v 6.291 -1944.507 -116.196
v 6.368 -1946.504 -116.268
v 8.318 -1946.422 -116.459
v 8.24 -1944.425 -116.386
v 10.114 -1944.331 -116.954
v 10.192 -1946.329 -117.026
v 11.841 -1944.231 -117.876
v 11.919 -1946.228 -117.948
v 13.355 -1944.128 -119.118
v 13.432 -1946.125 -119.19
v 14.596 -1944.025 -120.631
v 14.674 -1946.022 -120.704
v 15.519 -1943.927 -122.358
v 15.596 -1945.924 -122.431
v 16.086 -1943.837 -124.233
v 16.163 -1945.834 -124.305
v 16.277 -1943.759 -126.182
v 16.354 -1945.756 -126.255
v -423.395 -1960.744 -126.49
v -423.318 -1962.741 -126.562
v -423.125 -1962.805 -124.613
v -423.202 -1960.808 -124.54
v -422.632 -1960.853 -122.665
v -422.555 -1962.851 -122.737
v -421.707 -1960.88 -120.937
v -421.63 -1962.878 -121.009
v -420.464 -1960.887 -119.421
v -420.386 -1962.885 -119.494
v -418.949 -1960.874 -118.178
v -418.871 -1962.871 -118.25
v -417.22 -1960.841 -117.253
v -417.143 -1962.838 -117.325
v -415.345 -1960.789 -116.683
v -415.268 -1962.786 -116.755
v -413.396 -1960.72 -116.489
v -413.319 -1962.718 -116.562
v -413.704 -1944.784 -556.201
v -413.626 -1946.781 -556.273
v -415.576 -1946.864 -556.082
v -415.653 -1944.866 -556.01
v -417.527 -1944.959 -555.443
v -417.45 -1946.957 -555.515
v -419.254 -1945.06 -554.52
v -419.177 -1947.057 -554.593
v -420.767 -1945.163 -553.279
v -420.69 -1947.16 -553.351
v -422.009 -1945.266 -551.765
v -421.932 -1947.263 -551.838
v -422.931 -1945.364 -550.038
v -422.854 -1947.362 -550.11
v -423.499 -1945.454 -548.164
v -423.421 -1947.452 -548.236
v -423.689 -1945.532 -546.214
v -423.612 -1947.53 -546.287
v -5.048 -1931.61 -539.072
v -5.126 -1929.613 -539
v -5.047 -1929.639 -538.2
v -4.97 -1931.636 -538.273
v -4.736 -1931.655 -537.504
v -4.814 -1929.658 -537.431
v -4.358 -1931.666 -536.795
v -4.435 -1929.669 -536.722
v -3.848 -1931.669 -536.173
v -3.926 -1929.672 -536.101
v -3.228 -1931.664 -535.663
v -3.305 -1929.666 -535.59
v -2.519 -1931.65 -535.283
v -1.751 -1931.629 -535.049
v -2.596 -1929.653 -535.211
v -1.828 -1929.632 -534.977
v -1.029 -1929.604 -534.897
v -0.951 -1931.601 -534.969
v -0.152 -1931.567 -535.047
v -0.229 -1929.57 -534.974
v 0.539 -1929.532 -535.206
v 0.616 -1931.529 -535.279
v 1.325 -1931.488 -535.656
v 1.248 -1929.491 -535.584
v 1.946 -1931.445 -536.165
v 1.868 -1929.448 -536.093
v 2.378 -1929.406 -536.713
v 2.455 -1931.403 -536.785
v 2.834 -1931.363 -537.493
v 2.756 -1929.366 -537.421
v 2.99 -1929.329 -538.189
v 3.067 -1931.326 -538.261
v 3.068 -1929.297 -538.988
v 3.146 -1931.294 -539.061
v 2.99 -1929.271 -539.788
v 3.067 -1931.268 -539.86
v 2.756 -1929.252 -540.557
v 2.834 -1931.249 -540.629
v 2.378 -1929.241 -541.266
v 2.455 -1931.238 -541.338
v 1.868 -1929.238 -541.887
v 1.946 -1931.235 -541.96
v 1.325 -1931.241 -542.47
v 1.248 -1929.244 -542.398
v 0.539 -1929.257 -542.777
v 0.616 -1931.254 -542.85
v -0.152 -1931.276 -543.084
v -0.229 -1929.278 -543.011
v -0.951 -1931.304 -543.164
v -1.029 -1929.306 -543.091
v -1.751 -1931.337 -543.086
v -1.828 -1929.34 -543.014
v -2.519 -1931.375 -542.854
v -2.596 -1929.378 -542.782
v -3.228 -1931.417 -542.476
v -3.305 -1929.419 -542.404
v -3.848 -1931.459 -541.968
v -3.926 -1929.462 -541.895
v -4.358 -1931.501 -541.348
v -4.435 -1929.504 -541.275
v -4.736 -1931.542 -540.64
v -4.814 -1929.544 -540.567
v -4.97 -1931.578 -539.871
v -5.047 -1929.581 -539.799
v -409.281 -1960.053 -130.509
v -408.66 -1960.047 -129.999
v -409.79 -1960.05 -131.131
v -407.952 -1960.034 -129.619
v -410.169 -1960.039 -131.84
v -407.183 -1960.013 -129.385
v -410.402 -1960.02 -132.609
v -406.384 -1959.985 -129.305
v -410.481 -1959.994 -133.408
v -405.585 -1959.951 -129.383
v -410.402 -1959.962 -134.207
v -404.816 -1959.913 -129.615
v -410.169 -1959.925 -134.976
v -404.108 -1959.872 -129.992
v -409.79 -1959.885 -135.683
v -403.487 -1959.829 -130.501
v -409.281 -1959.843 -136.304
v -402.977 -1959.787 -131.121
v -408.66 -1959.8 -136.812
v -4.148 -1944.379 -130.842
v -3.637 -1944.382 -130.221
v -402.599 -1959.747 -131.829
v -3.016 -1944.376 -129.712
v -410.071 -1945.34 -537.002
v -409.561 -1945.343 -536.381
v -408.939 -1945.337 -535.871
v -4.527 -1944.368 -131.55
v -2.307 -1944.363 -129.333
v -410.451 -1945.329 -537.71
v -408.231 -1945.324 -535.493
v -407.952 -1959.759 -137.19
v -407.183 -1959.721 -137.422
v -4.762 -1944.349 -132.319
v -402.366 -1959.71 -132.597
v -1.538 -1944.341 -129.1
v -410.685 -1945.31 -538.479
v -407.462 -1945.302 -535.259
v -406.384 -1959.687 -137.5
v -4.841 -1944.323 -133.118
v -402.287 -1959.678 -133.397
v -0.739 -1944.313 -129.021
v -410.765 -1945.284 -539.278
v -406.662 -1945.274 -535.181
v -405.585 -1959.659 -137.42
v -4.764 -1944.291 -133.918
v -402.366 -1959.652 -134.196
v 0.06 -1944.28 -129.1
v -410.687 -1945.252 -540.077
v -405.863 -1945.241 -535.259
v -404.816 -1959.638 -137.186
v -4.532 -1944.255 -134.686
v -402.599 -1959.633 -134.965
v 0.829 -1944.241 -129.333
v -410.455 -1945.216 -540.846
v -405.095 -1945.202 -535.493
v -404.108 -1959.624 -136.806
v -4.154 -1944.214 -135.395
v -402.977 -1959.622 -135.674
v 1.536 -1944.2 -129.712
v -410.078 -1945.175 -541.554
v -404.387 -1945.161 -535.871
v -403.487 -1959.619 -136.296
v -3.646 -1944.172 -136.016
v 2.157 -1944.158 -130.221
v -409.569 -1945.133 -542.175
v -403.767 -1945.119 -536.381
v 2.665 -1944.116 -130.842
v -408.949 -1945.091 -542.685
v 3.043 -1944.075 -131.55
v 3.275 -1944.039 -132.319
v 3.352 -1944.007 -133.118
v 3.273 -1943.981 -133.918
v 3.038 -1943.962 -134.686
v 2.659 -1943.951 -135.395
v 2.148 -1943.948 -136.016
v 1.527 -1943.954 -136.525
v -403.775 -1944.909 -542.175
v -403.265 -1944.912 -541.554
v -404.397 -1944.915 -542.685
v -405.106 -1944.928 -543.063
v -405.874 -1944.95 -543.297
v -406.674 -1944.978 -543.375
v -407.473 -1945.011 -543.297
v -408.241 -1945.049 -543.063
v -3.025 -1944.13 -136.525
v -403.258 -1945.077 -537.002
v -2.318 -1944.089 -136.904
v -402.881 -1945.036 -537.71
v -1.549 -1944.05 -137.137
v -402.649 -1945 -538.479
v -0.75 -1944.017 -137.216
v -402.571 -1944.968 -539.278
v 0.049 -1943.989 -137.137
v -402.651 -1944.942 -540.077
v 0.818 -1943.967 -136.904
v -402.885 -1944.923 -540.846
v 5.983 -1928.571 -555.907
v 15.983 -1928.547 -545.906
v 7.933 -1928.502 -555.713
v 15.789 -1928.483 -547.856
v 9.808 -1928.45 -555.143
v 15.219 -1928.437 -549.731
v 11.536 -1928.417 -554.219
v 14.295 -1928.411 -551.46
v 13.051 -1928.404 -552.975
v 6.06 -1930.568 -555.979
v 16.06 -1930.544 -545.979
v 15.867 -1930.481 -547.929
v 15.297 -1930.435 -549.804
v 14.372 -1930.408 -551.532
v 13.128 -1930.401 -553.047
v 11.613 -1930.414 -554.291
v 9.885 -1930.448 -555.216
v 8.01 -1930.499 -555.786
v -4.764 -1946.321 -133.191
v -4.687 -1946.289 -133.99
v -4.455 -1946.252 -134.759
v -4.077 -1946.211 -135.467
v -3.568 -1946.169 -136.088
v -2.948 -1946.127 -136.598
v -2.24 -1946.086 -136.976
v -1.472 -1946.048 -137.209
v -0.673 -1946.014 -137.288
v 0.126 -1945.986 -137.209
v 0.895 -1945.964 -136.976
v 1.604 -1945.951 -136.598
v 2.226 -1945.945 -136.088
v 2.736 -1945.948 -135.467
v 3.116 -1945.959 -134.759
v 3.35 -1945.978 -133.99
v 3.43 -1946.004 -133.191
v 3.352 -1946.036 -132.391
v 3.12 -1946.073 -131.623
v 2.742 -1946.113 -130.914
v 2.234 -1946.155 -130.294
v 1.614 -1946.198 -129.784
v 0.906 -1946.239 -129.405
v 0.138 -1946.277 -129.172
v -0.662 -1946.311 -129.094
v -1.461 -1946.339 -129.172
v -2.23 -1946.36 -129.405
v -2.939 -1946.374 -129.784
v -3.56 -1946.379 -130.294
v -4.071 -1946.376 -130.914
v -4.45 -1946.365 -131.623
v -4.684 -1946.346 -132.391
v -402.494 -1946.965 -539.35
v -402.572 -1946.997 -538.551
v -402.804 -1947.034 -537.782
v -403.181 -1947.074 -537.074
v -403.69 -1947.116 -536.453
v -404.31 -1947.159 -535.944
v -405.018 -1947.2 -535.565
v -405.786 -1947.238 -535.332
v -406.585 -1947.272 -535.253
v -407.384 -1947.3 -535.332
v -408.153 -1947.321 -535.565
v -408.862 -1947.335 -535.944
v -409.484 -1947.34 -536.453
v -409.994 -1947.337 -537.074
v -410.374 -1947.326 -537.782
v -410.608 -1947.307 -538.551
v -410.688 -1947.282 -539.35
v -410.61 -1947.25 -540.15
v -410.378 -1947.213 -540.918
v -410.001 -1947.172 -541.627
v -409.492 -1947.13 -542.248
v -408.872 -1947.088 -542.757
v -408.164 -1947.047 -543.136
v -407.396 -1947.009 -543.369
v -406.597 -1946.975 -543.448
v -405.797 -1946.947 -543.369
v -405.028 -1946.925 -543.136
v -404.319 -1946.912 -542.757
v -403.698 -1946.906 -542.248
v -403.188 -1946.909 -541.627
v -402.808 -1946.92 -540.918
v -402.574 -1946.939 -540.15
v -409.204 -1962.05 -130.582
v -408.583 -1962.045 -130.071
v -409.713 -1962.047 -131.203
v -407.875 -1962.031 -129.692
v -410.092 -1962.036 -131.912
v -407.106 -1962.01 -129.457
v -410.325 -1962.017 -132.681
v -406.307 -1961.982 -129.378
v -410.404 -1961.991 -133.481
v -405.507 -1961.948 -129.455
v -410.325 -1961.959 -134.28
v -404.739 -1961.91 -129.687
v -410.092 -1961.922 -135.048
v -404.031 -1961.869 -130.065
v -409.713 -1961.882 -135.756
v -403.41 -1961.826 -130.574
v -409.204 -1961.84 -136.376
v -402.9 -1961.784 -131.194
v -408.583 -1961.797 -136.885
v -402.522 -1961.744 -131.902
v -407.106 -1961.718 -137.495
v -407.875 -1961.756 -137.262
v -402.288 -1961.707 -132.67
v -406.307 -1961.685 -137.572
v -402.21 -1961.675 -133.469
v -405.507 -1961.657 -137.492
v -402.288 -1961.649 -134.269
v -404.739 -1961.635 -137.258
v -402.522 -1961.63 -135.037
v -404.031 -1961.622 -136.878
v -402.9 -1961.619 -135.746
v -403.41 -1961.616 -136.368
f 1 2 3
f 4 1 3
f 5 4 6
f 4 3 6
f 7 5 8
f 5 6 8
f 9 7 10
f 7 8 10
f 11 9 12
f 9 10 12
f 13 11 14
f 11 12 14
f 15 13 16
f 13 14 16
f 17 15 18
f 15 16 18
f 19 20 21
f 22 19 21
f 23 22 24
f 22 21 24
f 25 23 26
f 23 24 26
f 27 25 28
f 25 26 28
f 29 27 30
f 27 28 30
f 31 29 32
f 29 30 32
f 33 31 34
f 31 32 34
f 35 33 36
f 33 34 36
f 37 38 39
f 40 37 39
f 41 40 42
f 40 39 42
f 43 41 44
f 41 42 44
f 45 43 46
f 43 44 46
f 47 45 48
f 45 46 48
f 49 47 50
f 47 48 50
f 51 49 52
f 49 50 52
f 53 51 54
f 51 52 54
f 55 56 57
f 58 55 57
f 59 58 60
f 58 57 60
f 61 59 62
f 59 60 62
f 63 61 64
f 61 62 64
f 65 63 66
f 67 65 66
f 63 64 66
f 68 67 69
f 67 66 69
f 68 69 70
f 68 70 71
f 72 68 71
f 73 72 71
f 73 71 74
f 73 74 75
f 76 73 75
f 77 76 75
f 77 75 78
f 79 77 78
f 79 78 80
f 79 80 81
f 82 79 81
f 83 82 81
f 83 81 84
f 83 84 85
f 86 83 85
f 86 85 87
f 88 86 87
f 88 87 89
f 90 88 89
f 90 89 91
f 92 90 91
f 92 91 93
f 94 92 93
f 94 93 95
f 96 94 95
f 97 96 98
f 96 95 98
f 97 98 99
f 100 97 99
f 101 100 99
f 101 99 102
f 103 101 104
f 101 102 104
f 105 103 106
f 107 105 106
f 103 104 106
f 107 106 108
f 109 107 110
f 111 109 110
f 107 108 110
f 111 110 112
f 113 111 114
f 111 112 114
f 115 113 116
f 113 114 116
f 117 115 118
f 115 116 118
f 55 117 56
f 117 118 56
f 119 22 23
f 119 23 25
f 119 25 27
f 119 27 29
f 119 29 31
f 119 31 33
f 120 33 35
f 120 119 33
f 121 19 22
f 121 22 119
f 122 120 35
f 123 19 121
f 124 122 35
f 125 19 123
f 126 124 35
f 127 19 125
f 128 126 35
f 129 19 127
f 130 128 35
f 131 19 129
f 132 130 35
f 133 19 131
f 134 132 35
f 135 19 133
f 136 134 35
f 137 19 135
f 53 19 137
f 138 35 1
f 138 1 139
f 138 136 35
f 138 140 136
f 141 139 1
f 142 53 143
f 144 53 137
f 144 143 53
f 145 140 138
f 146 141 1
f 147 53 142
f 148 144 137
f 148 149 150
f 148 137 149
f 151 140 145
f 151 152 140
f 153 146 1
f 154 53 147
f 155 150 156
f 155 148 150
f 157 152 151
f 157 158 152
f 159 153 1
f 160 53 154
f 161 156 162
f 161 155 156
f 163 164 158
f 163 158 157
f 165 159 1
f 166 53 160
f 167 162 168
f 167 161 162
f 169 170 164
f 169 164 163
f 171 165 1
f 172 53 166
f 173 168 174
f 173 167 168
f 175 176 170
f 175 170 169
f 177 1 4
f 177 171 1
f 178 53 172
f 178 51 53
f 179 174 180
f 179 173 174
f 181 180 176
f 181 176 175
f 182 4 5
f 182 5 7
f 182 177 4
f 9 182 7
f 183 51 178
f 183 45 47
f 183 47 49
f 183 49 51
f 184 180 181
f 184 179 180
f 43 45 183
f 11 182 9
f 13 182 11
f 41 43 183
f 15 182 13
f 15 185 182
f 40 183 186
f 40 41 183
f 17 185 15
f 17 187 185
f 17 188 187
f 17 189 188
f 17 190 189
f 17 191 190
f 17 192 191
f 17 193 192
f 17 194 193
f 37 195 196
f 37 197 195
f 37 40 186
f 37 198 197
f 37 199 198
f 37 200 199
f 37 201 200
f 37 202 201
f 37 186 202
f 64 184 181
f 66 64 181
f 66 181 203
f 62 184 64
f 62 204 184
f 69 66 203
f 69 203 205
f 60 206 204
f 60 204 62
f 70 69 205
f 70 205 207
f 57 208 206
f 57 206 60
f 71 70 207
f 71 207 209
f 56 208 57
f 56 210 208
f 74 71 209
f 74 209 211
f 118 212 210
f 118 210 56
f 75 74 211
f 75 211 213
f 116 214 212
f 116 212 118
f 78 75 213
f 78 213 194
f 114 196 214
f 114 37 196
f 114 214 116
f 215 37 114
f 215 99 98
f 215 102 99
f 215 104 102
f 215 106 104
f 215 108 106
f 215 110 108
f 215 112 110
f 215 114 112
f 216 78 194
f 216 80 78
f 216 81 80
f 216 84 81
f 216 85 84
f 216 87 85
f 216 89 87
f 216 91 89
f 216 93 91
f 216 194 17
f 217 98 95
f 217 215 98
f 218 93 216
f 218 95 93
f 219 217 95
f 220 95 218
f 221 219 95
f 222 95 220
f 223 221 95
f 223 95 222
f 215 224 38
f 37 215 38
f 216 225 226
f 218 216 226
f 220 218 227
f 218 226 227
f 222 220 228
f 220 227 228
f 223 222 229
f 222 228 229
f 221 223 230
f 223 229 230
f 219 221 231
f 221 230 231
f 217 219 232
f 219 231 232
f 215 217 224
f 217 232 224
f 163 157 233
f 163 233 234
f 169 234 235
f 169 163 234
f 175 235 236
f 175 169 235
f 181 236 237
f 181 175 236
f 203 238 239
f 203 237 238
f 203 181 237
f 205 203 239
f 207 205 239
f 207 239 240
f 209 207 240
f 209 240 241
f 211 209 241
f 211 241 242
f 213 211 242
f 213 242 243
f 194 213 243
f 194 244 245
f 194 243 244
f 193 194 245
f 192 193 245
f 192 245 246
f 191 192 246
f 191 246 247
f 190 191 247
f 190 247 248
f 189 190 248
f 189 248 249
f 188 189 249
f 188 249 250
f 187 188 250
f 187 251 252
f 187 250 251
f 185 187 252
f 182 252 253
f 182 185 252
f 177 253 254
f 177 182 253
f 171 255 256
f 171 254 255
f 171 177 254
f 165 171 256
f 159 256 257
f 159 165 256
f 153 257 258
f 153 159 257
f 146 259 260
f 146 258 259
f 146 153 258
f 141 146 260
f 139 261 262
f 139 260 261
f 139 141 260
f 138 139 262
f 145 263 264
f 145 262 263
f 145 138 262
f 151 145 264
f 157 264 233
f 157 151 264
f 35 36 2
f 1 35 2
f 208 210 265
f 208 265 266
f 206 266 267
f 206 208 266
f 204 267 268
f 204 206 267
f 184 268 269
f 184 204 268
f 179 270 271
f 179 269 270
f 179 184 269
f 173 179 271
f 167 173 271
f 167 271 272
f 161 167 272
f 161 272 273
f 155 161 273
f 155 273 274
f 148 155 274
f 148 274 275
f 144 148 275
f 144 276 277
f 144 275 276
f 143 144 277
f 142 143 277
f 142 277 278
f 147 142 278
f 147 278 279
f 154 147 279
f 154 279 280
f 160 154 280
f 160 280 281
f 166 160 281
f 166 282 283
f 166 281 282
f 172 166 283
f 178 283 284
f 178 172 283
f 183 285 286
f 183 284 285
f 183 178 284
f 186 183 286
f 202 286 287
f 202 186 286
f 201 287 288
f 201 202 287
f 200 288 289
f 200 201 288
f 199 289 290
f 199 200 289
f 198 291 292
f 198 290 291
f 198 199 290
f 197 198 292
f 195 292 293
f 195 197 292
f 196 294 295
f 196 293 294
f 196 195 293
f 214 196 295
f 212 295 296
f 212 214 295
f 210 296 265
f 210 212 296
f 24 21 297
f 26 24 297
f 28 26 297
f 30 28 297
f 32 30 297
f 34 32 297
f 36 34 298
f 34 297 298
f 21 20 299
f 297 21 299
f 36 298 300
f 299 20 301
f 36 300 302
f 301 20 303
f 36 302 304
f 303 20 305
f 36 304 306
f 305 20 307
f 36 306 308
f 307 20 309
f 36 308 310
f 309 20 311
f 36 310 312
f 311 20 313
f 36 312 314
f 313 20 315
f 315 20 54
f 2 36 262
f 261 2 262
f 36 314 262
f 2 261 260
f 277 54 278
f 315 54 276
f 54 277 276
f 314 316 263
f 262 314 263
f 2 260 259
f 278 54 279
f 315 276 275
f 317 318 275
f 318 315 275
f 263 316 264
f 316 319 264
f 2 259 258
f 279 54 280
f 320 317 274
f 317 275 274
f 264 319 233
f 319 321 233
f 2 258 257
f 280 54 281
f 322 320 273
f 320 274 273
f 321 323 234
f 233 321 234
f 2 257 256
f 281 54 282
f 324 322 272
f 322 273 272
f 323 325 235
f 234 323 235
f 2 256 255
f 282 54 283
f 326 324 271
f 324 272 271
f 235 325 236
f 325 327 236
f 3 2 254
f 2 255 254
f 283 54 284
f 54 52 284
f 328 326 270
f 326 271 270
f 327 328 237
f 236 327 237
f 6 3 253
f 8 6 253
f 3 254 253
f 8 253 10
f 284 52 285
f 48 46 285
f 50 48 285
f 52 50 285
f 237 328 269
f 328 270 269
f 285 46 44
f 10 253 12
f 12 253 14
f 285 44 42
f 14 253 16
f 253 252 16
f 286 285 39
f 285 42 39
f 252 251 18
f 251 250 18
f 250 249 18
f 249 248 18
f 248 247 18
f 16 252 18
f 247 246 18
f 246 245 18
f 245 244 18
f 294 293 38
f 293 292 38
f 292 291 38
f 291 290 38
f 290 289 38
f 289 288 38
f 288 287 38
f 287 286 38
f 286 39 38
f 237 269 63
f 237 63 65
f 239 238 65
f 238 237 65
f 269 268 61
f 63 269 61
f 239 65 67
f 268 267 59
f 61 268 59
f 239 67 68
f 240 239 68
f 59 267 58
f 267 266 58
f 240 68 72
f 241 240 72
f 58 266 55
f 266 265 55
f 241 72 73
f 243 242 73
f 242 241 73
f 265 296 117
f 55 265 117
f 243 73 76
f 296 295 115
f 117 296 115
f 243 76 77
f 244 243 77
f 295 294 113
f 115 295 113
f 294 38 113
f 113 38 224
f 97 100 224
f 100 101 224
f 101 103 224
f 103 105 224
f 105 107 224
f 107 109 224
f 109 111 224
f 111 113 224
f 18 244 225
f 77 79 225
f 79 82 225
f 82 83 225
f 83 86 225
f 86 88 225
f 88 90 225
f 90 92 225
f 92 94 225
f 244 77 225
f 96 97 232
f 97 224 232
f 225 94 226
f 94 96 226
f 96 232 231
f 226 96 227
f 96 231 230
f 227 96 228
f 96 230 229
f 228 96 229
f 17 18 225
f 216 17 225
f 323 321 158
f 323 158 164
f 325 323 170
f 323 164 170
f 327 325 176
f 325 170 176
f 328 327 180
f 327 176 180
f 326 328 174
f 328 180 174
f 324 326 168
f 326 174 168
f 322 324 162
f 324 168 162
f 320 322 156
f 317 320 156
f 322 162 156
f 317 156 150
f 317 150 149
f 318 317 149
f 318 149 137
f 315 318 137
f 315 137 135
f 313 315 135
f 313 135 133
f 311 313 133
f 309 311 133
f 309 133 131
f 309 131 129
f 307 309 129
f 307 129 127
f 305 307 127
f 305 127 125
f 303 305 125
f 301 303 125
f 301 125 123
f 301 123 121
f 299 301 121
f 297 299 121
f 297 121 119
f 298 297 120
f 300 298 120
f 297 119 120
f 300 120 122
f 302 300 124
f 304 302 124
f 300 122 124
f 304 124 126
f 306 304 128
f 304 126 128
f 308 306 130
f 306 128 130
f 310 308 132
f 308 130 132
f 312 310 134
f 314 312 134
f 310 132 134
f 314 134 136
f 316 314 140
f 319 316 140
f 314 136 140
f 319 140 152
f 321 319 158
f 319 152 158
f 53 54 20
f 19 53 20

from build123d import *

# Parameters (mm, degrees)
BOSS_EXTRUDE1_DEPTH     = 2
SKETCH3_R               = 4.1
CUT_EXTRUDE1_DEPTH      = 150
MIRROR2_COPY_1_SKETCH_R = 4.1
MIRROR2_COPY_1_DEPTH    = 150


with BuildPart() as part:
    # Sketch2 → Boss-Extrude1 (new body)
    with BuildSketch(Plane(origin=(75.209264803, -1945.500458031, -70.562482719), x_dir=(0.9992543484228519, 0.038603856587709914, 0.0006995817159617483), z_dir=(-0.03860385658770992, 0.998597990155389, 0.03621872877633121))):
        with BuildLine():
            Line((-488.860391094, 45.687428375), (-68.860391094, 45.687428375))
            ThreePointArc((-68.860391094, 45.687428375), (-61.789323282, 48.616360563), (-58.860391094, 55.687428375))
            Line((-58.860391094, 55.687428375), (-58.860391094, 475.687428375))
            ThreePointArc((-58.860391094, 475.687428375), (-61.789323282, 482.758496187), (-68.860391094, 485.687428375))
            Line((-68.860391094, 485.687428375), (-488.860391094, 485.687428375))
            ThreePointArc((-488.860391094, 485.687428375), (-495.931458906, 482.758496187), (-498.860391094, 475.687428375))
            Line((-498.860391094, 475.687428375), (-498.860391094, 55.687428375))
            ThreePointArc((-498.860391094, 55.687428375), (-495.931458906, 48.616360563), (-488.860391094, 45.687428375))
        make_face()
    extrude(amount=BOSS_EXTRUDE1_DEPTH)

    # Sketch3 → Cut-Extrude1 (cut)
    with BuildSketch(Plane(origin=(-103.287183068, -1885.761116085, -334.134352796), x_dir=(-0.0006995817159619569, 0.036218728776338416, -0.9993436417325368), z_dir=(0.038603856587716694, -0.9985979901553884, -0.036218728776338416))):
        with Locations(Location((-203.071067812, 100.352249502, 0), (0, 0, 269.959890601))):
            Circle(SKETCH3_R)
    cut_extrude1 = extrude(amount=CUT_EXTRUDE1_DEPTH, mode=Mode.SUBTRACT)

    # Mirror1: Cut-Extrude1 across plane
    add(cut_extrude1.mirror(Plane(origin=(-278.652458404, -10.765086546, -0.195085631), x_dir=(-0.000699060242817171, -2.700655884307846e-05, 0.9999997552926815), z_dir=(-0.9992543484228519, -0.03860385658770997, -0.0006995817159618643))), mode=Mode.SUBTRACT)

    # Mirror2: Cut-Extrude1 across plane
    add(cut_extrude1.mirror(Plane(origin=(-0.185870067, 9.622860908, -265.513042235), x_dir=(0.9999997552926815, 2.5337966627687505e-05, -0.0006991227107992283), z_dir=(0.0006995817159618217, -0.036218728776331255, 0.9993436417325371))), mode=Mode.SUBTRACT)

    # Mirror2 copy 1 sketch → Mirror2 copy 1 (cut)
    with BuildSketch(Plane(origin=(-308.371783919, -1893.684080376, -334.277933294), x_dir=(0.0006995817159616872, -0.0362187287763241, 0.9993436417325376), z_dir=(0.03860385658770326, -0.9985979901553895, -0.0362187287763241))):
        with Locations(Location((-203.071067812, 100.352249502, 0), (0, 0, 269.959890601))):
            Circle(MIRROR2_COPY_1_SKETCH_R)
    extrude(amount=MIRROR2_COPY_1_DEPTH, mode=Mode.SUBTRACT)


solid = part.part
